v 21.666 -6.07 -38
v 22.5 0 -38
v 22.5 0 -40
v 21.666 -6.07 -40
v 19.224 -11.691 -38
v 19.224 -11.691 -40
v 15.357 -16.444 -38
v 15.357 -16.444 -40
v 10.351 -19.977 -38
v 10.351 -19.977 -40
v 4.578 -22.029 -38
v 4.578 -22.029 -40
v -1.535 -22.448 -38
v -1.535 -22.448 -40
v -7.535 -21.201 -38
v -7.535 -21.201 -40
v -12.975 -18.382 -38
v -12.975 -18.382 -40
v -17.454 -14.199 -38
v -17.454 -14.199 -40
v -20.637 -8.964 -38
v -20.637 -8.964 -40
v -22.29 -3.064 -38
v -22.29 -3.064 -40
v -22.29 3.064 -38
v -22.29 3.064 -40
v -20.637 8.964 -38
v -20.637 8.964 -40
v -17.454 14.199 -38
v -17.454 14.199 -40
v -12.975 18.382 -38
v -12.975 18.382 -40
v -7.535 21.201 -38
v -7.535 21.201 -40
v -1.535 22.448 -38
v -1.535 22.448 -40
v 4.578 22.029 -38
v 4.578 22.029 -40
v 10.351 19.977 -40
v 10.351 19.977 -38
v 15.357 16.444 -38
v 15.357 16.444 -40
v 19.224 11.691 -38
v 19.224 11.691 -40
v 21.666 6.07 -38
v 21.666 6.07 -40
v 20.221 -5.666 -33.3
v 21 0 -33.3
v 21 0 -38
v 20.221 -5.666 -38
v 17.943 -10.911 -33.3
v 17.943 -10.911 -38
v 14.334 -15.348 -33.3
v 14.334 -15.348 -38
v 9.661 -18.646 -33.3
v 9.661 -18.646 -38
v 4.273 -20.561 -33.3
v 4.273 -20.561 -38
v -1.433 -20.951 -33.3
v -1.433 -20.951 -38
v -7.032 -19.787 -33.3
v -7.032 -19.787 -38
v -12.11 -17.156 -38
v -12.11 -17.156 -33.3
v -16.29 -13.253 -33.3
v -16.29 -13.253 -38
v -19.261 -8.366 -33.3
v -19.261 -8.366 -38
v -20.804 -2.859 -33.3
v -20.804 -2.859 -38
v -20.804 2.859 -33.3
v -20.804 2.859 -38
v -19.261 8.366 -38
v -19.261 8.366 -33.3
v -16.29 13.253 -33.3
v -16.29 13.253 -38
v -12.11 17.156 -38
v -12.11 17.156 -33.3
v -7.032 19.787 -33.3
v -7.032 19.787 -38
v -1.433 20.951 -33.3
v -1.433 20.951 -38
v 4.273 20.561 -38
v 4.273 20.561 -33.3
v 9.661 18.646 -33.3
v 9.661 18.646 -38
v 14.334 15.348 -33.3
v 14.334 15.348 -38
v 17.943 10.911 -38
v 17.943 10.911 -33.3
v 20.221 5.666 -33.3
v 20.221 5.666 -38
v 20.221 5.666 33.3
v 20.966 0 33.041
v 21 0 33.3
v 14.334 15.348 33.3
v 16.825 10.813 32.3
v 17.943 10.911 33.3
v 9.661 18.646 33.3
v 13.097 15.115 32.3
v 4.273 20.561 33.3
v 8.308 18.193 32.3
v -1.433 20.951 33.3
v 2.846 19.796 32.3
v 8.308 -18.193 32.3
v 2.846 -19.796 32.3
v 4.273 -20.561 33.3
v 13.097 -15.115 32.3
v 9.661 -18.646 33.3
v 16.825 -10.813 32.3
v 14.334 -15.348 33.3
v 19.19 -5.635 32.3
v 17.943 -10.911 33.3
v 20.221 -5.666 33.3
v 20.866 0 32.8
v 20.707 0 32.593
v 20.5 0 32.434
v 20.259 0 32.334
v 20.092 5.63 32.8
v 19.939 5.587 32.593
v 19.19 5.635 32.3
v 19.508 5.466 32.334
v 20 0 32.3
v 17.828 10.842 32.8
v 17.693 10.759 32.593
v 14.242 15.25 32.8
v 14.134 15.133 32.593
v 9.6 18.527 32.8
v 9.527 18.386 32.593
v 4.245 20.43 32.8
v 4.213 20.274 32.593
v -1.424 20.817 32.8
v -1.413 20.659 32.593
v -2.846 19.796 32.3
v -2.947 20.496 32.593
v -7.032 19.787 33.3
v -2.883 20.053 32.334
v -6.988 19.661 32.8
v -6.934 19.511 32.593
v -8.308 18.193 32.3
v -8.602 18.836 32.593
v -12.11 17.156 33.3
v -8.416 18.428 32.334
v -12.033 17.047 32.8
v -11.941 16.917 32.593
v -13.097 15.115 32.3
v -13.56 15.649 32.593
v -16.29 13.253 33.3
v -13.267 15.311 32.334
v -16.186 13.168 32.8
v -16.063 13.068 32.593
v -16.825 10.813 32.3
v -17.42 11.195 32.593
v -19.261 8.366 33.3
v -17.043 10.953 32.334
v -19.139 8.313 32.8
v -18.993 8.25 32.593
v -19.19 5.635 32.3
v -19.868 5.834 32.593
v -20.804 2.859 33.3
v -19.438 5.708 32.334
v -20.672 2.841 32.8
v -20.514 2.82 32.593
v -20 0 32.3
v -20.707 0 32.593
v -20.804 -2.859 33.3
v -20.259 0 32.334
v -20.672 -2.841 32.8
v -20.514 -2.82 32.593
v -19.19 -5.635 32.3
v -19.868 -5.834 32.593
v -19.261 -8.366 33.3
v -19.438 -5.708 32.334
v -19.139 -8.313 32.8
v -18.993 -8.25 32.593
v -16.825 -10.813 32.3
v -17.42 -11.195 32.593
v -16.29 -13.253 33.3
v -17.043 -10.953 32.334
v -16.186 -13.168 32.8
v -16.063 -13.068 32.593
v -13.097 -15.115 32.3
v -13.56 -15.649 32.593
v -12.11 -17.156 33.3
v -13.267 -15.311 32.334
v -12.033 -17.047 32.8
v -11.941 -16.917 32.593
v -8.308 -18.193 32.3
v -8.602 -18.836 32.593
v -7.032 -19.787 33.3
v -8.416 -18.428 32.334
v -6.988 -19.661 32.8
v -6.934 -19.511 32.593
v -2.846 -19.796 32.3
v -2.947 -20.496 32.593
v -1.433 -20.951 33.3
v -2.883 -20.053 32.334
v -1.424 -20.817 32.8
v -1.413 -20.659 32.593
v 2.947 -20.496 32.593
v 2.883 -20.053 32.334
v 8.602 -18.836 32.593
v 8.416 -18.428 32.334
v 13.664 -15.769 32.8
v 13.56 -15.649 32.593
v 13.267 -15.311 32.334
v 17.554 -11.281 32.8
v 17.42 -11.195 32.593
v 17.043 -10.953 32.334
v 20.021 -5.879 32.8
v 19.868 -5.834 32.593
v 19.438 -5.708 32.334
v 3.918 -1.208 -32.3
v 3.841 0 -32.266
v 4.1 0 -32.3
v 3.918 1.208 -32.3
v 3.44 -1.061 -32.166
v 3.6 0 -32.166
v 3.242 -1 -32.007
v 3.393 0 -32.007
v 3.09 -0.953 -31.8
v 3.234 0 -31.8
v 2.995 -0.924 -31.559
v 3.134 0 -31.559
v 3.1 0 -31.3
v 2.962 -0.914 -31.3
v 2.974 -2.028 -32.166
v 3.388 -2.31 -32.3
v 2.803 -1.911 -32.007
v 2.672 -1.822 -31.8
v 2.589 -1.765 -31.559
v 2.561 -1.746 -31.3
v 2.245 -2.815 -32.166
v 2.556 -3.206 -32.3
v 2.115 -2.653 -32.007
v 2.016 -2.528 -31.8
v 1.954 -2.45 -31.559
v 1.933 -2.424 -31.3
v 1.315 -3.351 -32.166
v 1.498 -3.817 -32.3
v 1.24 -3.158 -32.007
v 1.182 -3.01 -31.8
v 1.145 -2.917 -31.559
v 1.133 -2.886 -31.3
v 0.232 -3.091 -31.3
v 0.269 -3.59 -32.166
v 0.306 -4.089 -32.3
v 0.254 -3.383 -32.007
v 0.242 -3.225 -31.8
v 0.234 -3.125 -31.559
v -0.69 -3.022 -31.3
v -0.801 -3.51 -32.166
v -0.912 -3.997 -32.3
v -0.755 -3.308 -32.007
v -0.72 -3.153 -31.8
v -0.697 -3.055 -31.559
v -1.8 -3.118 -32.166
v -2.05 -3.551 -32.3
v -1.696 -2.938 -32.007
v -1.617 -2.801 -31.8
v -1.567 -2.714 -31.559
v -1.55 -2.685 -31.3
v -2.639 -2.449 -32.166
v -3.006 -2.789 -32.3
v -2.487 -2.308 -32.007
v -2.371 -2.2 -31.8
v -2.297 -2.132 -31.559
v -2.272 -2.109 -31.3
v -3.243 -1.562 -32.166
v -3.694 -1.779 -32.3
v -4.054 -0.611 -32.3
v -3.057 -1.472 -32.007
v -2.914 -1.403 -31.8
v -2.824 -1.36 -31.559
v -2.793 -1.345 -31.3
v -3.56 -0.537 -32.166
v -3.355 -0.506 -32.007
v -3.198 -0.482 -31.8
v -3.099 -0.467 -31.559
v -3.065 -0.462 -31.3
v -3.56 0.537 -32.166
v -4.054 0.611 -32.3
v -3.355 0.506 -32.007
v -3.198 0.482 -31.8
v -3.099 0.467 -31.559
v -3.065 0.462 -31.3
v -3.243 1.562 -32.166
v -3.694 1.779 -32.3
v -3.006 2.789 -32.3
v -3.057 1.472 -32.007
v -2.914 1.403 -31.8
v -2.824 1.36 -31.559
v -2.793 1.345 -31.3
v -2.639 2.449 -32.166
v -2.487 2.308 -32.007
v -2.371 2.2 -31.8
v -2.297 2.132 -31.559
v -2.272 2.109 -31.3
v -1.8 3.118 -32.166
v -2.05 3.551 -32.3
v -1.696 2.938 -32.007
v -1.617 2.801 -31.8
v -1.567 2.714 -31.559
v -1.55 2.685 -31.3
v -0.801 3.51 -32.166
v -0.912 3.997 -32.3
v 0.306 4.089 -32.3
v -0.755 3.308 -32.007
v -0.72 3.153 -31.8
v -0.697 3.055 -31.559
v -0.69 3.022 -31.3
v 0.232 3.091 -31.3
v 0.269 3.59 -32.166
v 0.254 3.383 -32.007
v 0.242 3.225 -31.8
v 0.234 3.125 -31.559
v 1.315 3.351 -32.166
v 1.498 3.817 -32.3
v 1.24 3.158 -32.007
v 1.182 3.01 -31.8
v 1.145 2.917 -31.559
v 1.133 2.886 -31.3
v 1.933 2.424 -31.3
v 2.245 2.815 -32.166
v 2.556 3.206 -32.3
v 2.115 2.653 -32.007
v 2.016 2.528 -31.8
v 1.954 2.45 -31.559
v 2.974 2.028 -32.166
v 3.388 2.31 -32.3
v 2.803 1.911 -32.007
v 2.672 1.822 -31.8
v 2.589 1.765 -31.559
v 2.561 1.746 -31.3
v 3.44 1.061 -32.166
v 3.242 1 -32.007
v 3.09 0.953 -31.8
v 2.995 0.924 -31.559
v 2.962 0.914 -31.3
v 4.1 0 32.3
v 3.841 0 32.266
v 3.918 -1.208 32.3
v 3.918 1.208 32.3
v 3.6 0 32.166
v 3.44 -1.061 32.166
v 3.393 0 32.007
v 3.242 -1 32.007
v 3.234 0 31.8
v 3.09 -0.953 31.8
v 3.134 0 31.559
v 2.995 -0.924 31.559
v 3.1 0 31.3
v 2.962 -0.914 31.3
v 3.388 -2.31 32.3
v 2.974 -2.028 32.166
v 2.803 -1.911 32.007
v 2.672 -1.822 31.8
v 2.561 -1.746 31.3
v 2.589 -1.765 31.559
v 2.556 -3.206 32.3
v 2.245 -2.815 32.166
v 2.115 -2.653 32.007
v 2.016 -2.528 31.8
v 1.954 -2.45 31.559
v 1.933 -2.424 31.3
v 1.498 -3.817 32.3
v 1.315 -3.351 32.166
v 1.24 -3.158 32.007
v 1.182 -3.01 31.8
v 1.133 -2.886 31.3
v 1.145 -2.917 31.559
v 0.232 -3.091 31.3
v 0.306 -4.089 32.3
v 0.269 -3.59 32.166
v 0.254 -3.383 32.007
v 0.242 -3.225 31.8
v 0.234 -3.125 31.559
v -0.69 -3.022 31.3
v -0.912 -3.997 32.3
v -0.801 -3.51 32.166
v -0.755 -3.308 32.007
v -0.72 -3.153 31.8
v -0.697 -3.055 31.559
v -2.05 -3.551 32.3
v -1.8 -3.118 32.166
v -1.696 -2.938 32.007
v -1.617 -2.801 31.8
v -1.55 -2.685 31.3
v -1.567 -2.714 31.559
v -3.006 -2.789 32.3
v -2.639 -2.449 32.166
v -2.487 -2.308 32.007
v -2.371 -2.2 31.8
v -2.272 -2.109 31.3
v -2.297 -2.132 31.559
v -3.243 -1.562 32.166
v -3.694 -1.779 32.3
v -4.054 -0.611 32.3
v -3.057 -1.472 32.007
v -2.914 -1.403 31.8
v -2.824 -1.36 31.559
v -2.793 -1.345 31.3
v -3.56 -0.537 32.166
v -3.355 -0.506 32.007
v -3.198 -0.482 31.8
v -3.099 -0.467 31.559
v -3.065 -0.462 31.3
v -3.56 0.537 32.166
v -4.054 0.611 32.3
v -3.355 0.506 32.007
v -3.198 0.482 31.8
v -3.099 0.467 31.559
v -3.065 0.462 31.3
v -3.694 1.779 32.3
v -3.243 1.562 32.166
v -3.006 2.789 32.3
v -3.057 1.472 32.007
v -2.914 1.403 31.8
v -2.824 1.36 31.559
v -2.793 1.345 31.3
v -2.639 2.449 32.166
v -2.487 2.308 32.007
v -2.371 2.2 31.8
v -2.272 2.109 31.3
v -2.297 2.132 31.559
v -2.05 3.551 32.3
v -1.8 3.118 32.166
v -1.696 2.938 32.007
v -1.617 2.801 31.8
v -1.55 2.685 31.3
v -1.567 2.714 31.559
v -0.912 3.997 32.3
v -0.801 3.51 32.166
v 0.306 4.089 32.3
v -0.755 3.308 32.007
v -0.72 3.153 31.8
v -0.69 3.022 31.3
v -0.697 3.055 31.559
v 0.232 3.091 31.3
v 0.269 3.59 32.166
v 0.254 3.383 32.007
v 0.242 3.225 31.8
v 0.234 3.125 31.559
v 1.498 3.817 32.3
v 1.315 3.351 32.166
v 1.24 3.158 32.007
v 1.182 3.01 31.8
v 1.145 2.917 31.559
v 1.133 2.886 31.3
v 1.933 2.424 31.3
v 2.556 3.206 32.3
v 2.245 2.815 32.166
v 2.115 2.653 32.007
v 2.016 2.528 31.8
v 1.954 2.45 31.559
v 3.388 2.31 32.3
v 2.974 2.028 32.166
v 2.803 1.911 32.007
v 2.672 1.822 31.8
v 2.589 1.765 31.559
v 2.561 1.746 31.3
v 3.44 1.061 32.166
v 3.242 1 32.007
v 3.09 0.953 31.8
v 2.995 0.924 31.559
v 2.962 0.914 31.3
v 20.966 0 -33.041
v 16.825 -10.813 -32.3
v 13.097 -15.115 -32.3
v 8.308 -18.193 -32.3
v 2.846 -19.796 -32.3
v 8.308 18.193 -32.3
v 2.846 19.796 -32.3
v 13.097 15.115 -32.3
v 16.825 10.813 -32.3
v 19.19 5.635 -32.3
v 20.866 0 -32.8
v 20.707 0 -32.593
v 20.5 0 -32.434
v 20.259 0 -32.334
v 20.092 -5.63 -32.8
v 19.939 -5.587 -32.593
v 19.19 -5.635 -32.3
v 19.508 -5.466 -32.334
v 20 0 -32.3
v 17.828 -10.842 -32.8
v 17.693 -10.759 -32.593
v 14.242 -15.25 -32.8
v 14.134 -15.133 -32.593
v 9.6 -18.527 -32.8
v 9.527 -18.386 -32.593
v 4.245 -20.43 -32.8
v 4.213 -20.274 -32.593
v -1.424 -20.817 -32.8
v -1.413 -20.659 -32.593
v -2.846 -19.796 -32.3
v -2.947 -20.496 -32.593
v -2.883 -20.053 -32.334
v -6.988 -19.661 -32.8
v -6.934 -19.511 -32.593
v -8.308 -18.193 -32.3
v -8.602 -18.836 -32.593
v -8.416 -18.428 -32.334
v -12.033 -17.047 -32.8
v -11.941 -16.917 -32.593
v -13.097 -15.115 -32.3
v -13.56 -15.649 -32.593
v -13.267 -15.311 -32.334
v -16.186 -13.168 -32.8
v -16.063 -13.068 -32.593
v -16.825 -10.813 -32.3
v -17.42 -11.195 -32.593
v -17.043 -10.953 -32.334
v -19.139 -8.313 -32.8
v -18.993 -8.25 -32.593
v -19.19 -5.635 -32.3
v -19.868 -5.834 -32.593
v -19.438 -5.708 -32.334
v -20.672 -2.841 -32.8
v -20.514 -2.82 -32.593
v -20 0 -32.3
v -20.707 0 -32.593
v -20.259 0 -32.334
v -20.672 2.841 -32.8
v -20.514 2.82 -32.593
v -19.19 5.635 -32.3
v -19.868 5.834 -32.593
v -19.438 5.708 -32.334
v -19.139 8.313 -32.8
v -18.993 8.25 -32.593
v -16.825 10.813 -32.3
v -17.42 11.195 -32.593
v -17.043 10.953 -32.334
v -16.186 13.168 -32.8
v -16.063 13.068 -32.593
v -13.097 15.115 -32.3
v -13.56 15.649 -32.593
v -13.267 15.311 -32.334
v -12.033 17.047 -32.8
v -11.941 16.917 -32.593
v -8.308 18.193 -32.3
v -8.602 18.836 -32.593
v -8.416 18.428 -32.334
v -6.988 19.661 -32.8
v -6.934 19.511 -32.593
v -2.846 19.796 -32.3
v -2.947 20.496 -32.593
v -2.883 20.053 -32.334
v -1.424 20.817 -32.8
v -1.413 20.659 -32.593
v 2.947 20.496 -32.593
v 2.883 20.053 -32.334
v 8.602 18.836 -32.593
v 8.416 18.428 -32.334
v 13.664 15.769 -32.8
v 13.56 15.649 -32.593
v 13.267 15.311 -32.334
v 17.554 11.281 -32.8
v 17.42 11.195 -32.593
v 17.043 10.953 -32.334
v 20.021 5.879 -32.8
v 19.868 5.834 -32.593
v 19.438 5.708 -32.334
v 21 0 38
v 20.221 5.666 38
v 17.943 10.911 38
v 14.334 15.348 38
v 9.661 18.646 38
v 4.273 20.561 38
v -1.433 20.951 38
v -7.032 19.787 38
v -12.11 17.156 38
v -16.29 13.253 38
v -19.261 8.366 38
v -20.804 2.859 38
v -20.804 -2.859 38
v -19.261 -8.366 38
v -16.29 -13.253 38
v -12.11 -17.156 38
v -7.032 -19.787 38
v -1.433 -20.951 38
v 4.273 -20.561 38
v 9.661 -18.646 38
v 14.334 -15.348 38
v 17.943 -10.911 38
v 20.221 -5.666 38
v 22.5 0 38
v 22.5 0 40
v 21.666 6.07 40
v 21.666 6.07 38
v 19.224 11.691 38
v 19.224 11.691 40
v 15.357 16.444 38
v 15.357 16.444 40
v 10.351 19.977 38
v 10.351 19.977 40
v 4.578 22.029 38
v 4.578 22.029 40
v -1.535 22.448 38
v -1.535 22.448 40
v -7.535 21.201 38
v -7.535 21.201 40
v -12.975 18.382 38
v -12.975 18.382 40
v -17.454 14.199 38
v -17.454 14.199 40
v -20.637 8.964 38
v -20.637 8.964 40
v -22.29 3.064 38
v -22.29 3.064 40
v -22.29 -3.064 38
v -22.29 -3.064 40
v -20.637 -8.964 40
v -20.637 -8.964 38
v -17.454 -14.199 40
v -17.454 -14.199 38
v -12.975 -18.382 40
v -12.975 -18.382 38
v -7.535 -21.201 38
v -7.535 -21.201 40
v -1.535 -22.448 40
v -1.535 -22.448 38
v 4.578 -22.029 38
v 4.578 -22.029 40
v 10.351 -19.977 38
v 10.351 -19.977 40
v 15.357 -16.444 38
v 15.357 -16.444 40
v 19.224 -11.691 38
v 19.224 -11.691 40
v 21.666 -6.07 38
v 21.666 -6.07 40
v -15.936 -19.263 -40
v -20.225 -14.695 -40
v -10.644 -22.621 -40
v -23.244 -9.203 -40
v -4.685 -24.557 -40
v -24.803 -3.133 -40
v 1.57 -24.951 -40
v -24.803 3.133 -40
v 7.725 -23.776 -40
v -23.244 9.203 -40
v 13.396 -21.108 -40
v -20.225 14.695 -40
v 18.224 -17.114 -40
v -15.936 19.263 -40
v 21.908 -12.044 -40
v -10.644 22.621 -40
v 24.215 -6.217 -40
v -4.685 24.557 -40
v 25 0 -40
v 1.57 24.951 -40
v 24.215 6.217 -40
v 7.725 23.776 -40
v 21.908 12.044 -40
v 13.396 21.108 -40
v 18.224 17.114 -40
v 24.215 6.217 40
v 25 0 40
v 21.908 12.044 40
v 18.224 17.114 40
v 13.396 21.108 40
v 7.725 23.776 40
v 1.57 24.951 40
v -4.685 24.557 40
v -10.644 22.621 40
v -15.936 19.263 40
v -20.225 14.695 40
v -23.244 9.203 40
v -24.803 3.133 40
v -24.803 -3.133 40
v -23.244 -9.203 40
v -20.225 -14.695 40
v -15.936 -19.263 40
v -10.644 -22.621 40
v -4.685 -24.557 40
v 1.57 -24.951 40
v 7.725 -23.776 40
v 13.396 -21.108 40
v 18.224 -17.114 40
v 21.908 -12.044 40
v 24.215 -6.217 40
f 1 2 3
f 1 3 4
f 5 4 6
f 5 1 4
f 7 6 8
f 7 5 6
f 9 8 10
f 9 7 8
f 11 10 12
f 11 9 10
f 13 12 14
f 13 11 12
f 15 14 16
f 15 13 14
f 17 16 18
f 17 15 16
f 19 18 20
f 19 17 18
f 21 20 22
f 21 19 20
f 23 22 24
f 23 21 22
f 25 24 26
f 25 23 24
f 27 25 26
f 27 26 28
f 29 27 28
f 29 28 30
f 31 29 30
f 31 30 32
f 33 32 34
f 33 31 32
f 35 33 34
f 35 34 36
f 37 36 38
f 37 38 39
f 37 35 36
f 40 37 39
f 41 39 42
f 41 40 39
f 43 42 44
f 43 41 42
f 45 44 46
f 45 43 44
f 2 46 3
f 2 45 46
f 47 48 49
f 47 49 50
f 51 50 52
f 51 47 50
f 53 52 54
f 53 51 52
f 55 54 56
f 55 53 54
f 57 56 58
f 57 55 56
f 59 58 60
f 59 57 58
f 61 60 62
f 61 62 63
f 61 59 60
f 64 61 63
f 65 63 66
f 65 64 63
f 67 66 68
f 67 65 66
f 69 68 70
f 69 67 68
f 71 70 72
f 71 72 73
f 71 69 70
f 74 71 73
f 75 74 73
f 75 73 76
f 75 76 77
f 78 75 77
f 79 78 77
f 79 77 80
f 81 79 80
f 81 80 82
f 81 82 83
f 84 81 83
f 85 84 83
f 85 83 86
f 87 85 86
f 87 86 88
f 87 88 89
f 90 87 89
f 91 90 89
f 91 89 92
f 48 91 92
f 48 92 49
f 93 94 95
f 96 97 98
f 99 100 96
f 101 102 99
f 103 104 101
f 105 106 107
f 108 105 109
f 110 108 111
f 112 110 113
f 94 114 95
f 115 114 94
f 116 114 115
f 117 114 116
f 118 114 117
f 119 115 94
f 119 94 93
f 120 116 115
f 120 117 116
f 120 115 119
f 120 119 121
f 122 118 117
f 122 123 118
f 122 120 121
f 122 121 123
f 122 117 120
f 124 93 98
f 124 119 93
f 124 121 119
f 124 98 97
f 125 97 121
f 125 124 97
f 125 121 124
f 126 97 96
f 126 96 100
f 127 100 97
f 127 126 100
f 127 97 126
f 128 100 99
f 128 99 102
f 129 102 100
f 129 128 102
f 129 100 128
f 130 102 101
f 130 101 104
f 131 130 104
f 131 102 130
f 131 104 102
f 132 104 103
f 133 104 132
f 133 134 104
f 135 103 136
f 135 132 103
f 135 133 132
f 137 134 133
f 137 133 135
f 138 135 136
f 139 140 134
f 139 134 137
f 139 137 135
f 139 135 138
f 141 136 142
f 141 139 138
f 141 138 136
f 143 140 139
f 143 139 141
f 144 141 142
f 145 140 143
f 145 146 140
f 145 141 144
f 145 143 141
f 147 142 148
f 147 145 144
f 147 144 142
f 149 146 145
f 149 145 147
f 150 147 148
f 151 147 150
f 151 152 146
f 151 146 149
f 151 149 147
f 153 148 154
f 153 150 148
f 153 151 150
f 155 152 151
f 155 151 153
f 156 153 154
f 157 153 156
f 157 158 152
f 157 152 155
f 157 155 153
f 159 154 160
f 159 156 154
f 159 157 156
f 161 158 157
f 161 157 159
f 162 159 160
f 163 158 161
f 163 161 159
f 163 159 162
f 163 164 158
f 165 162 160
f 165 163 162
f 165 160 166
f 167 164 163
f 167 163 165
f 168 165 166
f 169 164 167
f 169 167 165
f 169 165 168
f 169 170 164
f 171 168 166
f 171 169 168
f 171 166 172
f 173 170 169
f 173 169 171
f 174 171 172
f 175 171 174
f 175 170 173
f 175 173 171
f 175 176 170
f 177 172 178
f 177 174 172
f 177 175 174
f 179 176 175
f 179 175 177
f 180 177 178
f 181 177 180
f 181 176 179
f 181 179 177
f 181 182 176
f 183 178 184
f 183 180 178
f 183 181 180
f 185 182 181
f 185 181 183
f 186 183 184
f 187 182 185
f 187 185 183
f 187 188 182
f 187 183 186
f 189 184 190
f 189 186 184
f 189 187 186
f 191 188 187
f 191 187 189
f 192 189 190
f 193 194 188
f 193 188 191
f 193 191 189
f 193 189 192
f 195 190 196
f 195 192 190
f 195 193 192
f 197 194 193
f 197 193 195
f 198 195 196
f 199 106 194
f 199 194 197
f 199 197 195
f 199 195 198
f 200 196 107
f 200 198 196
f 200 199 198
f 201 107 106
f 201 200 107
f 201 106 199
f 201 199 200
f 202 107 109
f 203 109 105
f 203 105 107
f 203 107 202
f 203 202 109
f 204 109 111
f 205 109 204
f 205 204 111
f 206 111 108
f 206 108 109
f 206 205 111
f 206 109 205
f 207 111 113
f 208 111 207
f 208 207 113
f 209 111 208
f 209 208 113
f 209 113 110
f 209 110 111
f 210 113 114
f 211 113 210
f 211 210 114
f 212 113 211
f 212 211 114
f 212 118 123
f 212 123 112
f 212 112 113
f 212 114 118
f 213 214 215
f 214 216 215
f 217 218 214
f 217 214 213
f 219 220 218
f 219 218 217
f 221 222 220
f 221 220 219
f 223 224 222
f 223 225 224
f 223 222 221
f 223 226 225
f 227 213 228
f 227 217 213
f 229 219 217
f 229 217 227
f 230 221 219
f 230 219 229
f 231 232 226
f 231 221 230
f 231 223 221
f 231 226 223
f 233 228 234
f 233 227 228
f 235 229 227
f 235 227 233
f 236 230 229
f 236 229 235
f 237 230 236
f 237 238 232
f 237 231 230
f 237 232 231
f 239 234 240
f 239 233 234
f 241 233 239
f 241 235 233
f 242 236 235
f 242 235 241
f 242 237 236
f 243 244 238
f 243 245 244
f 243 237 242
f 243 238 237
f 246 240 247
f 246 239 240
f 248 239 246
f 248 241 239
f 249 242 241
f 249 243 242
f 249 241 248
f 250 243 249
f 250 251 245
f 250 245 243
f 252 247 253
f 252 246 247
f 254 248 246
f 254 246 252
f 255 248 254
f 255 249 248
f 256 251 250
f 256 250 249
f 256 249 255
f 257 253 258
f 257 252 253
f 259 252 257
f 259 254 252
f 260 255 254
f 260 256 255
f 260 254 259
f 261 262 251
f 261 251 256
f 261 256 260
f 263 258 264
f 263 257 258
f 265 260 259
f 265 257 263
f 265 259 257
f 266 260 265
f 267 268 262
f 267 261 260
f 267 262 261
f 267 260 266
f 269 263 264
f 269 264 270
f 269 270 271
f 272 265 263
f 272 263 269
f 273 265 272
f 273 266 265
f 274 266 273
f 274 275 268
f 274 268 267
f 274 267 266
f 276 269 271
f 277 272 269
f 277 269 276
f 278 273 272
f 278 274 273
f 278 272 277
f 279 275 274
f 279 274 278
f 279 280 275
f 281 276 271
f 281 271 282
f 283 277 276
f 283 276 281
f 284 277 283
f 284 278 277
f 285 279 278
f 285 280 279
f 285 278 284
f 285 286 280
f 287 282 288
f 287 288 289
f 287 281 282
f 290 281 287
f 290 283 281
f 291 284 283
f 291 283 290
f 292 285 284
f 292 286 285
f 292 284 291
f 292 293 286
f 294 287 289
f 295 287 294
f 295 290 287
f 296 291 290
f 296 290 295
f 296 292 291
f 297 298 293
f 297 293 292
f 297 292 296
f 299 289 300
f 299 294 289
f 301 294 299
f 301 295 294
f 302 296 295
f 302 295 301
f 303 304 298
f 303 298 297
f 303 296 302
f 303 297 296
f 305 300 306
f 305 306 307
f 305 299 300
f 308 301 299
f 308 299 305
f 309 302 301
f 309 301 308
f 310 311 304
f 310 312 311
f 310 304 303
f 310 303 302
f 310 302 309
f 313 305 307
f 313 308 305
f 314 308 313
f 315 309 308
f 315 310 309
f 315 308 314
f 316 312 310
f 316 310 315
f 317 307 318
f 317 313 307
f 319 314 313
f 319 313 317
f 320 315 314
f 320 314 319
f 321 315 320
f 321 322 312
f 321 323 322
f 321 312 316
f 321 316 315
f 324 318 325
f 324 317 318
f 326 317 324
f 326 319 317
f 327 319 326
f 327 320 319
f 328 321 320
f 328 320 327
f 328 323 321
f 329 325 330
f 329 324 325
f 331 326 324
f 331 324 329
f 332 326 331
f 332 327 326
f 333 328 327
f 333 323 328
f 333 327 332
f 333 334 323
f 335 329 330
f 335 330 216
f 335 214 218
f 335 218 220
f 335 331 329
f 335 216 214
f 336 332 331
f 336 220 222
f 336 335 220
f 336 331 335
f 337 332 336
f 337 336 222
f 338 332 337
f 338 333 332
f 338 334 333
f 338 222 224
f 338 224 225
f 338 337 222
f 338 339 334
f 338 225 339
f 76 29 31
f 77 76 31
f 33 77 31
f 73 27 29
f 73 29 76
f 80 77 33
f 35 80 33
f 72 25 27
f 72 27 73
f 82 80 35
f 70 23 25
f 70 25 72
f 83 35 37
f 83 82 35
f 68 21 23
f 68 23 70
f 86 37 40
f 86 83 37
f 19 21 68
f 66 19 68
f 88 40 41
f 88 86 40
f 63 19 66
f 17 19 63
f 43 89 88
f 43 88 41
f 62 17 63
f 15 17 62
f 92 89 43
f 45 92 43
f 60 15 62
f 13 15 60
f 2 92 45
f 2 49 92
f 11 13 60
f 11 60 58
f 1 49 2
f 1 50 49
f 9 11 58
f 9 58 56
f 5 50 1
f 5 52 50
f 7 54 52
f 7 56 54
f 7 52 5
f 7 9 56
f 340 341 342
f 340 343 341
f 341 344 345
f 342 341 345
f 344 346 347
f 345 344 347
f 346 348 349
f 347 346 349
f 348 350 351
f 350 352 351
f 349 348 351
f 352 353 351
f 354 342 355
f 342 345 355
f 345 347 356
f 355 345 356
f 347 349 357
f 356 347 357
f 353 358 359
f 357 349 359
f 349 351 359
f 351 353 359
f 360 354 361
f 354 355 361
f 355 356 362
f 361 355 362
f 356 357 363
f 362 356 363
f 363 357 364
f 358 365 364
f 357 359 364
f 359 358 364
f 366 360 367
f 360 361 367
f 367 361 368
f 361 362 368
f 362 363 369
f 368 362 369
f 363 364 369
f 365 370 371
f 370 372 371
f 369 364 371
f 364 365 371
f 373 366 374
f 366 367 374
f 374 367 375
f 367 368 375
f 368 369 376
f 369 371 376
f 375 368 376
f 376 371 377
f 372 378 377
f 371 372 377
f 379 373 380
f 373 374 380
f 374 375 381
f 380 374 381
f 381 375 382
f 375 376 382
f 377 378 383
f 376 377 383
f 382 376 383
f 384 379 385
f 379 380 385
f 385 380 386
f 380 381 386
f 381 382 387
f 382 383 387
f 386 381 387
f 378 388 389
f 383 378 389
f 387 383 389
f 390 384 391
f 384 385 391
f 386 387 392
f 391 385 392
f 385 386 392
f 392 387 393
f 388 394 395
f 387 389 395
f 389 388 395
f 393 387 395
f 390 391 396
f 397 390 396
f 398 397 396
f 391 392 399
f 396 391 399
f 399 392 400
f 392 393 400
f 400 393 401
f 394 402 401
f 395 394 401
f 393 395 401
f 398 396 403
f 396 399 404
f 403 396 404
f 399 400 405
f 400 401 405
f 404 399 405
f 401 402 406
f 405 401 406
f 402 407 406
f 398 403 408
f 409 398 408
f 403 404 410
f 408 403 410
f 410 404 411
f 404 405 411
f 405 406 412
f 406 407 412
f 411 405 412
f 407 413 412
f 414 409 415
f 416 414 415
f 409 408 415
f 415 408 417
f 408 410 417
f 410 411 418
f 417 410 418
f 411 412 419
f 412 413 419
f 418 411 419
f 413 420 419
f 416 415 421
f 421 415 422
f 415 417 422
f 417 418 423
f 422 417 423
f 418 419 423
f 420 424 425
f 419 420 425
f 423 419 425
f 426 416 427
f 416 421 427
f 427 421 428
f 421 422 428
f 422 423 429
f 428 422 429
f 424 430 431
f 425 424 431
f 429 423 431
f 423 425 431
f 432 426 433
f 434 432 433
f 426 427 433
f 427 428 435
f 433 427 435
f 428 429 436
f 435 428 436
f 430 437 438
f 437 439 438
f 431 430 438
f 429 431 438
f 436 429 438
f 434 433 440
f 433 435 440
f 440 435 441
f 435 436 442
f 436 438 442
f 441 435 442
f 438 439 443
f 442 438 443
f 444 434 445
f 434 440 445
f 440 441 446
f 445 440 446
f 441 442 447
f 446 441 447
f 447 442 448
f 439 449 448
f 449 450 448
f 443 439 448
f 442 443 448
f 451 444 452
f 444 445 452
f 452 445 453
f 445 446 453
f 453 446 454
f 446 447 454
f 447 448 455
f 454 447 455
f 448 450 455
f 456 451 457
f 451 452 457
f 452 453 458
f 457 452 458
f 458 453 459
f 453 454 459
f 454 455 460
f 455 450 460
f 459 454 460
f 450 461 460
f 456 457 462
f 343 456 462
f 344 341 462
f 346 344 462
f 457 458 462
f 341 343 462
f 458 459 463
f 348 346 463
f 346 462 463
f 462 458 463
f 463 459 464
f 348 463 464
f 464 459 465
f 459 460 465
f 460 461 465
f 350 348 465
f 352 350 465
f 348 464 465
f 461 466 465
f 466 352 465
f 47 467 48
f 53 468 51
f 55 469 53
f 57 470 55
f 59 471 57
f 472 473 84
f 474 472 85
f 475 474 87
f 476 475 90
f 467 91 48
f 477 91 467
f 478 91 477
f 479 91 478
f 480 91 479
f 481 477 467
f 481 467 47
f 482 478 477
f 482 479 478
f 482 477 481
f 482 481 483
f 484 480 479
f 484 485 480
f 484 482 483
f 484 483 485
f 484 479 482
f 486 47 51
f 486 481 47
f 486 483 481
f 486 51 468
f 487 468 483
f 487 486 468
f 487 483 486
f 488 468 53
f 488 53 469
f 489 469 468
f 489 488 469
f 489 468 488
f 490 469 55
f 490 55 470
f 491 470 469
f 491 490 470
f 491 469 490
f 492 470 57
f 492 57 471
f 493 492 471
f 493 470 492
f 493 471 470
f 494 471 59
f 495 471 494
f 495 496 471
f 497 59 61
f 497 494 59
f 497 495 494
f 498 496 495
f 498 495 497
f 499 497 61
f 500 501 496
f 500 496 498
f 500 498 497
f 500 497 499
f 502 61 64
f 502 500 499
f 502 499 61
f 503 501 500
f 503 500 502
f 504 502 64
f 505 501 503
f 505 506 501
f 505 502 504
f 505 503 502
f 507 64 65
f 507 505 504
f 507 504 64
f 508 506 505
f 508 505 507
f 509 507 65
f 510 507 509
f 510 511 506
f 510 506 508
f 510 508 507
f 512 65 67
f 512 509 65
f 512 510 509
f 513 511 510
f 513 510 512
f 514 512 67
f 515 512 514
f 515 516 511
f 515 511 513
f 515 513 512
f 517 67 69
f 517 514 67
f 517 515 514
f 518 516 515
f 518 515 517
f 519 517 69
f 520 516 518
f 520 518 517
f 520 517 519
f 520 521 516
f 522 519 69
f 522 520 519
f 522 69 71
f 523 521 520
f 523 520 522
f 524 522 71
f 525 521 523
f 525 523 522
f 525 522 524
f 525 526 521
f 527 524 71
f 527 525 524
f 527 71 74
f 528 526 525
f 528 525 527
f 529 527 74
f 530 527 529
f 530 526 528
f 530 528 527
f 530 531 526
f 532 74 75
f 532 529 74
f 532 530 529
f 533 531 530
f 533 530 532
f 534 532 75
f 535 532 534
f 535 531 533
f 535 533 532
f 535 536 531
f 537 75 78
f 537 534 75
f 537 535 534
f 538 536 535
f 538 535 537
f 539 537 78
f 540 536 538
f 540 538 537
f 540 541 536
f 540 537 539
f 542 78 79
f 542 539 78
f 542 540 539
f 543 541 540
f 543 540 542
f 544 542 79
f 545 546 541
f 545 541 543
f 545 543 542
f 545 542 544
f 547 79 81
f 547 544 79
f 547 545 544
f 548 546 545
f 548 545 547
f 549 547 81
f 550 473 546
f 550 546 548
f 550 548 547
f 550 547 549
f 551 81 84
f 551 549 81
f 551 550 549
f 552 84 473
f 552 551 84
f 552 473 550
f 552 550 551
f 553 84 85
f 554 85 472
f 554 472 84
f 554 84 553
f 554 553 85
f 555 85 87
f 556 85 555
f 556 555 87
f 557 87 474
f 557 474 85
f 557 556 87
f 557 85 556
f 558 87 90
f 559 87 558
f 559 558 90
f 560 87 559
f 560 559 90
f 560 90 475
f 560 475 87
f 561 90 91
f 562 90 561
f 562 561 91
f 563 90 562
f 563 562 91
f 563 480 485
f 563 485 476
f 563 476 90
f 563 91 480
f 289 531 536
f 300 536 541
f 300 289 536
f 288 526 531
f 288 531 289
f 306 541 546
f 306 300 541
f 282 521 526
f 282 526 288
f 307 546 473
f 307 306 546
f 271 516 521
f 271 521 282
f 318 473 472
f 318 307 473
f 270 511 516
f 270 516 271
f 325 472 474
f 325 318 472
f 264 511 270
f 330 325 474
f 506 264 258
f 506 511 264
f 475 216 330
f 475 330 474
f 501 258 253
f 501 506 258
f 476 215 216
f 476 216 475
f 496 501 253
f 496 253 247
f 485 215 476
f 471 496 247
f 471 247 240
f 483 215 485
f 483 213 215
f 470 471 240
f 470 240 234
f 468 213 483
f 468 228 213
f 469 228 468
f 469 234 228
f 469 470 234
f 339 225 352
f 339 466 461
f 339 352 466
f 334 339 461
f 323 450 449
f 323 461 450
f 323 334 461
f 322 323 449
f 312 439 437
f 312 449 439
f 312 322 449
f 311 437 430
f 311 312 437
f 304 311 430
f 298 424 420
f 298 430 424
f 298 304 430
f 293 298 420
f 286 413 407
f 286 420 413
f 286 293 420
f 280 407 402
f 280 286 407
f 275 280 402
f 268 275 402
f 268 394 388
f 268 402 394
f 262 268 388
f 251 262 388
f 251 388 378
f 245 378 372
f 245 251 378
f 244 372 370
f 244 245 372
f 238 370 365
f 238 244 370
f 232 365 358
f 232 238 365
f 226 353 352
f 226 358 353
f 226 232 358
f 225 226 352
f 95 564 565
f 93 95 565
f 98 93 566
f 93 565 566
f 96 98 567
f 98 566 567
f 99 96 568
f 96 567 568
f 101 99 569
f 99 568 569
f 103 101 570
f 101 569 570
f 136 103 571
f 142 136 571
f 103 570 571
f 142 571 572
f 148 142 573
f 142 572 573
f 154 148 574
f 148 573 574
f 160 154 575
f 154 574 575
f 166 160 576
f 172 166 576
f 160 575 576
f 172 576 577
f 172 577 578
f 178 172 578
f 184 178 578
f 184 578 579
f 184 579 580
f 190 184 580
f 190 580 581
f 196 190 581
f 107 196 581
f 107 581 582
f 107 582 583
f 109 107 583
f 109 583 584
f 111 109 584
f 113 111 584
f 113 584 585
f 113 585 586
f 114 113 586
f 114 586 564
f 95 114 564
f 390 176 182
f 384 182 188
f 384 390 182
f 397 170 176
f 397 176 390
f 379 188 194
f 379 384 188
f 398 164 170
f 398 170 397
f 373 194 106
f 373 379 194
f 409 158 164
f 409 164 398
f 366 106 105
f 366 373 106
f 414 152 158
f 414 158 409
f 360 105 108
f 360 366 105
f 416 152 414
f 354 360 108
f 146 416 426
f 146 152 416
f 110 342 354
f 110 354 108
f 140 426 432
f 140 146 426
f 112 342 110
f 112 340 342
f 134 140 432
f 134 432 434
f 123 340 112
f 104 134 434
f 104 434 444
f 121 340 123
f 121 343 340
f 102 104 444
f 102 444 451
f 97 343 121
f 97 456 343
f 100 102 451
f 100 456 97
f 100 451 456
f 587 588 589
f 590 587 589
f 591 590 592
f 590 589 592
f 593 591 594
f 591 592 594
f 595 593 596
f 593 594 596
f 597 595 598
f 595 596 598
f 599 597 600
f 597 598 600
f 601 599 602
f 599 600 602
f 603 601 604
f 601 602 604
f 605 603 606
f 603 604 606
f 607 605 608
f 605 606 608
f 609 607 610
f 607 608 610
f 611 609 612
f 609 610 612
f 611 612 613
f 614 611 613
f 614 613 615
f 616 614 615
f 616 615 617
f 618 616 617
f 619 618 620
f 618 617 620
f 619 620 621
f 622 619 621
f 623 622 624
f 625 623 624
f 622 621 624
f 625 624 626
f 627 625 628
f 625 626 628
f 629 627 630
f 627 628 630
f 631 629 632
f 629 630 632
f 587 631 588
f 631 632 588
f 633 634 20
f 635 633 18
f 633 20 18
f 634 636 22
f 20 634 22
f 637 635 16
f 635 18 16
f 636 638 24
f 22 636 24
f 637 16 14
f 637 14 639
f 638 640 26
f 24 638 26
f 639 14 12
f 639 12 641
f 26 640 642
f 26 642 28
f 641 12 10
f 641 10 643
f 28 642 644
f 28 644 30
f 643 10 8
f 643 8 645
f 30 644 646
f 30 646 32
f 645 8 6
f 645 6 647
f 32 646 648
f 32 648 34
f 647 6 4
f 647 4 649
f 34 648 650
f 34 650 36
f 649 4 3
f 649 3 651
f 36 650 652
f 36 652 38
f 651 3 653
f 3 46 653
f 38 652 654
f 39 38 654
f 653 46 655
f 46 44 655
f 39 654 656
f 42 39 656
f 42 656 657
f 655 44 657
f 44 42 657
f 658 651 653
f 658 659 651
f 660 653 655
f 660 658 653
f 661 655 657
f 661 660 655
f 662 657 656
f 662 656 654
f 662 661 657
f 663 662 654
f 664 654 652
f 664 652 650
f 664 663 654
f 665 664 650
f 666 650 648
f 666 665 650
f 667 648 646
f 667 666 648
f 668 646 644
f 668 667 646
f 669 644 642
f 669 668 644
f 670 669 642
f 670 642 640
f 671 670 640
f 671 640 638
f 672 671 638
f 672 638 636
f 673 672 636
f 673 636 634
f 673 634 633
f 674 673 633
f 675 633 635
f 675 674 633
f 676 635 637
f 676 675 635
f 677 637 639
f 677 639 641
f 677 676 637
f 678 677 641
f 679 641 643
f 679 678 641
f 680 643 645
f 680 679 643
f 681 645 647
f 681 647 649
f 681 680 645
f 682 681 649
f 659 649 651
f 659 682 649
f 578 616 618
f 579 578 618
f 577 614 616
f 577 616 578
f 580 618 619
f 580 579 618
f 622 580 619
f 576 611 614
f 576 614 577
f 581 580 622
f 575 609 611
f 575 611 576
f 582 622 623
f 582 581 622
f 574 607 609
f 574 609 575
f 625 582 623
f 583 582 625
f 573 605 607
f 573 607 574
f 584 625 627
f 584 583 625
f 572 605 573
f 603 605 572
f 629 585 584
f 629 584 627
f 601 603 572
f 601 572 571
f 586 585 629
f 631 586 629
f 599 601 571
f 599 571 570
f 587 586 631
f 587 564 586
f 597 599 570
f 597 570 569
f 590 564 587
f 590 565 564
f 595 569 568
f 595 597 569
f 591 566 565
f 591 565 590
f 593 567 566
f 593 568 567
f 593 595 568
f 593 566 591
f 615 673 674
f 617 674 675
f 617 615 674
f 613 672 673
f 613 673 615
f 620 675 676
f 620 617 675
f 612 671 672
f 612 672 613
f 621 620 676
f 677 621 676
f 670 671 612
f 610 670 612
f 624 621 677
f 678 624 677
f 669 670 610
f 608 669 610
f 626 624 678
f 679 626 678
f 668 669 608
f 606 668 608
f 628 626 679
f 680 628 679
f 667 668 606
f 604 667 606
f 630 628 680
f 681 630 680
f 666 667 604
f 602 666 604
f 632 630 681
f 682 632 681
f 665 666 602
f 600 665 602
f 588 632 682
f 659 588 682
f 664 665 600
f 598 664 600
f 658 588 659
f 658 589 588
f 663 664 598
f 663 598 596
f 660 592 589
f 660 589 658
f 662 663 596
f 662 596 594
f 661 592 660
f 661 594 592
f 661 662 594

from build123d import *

# Parameters (mm, degrees)
ESBO_O1_R                = 25
ESBO_O1_R_2              = 3.1
RESSALTO_EXTRUS_O1_DEPTH = 40
ESBO_O3_R                = 21
CORTE_EXTRUS_O1_DEPTH    = 7.7
CORTE_EXTRUS_O2_START    = -7.7
ESBO_O4_R                = 21
CORTE_EXTRUS_O2_DEPTH    = 7.7
FILETE1_R                = 1
ESBO_O11_R               = 22.5
ESBO_O11_R_2             = 21
CORTE_EXTRUS_O3_DEPTH    = 2
CORTE_EXTRUS_O4_START    = -2
ESBO_O12_R               = 22.5
ESBO_O12_R_2             = 21
CORTE_EXTRUS_O4_DEPTH    = 2


with BuildPart() as part:
    # Esboço1 → Ressalto-extrusão1 (new, symmetric)
    with BuildSketch(Plane.XY):
        Circle(ESBO_O1_R)
        Circle(ESBO_O1_R_2, mode=Mode.SUBTRACT)
    extrude(amount=RESSALTO_EXTRUS_O1_DEPTH, both=True)

    # Esboço3 → Corte-extrusão1 (cut)
    with BuildSketch(Plane.XY.offset(40)):
        Circle(ESBO_O3_R)
    extrude(amount=-CORTE_EXTRUS_O1_DEPTH, mode=Mode.SUBTRACT)

    # Esboço4 → Corte-extrusão2 (cut)
    with BuildSketch(Plane(origin=(0, 0, -40), x_dir=(-1, 0, 0), z_dir=(0, 0, -1)).offset(CORTE_EXTRUS_O2_START)):
        with Locations(Location((0, 0, 0), (0, 0, 180))):
            Circle(ESBO_O4_R)
    extrude(amount=CORTE_EXTRUS_O2_DEPTH, mode=Mode.SUBTRACT)

    # Filete1
    filete1_edges = [part.edges().sort_by_distance(p)[0] for p in [
        (-21, 0, 32.3),
        (-3.1, 0, 32.3),
        (-21, 0, -32.3),
        (-3.1, 0, -32.3),
    ]]
    fillet(filete1_edges, radius=FILETE1_R)

    # Esboço11 → Corte-extrusão3 (cut)
    with BuildSketch(Plane.XY.offset(40)):
        Circle(ESBO_O11_R)
        Circle(ESBO_O11_R_2, mode=Mode.SUBTRACT)
    extrude(amount=-CORTE_EXTRUS_O3_DEPTH, mode=Mode.SUBTRACT)

    # Esboço12 → Corte-extrusão4 (cut)
    with BuildSketch(Plane(origin=(0, 0, -40), x_dir=(-1, 0, 0), z_dir=(0, 0, -1)).offset(CORTE_EXTRUS_O4_START)):
        with Locations(Location((0, 0, 0), (0, 0, 180))):
            Circle(ESBO_O12_R)
        Circle(ESBO_O12_R_2, mode=Mode.SUBTRACT)
    extrude(amount=CORTE_EXTRUS_O4_DEPTH, mode=Mode.SUBTRACT)


solid = part.part
